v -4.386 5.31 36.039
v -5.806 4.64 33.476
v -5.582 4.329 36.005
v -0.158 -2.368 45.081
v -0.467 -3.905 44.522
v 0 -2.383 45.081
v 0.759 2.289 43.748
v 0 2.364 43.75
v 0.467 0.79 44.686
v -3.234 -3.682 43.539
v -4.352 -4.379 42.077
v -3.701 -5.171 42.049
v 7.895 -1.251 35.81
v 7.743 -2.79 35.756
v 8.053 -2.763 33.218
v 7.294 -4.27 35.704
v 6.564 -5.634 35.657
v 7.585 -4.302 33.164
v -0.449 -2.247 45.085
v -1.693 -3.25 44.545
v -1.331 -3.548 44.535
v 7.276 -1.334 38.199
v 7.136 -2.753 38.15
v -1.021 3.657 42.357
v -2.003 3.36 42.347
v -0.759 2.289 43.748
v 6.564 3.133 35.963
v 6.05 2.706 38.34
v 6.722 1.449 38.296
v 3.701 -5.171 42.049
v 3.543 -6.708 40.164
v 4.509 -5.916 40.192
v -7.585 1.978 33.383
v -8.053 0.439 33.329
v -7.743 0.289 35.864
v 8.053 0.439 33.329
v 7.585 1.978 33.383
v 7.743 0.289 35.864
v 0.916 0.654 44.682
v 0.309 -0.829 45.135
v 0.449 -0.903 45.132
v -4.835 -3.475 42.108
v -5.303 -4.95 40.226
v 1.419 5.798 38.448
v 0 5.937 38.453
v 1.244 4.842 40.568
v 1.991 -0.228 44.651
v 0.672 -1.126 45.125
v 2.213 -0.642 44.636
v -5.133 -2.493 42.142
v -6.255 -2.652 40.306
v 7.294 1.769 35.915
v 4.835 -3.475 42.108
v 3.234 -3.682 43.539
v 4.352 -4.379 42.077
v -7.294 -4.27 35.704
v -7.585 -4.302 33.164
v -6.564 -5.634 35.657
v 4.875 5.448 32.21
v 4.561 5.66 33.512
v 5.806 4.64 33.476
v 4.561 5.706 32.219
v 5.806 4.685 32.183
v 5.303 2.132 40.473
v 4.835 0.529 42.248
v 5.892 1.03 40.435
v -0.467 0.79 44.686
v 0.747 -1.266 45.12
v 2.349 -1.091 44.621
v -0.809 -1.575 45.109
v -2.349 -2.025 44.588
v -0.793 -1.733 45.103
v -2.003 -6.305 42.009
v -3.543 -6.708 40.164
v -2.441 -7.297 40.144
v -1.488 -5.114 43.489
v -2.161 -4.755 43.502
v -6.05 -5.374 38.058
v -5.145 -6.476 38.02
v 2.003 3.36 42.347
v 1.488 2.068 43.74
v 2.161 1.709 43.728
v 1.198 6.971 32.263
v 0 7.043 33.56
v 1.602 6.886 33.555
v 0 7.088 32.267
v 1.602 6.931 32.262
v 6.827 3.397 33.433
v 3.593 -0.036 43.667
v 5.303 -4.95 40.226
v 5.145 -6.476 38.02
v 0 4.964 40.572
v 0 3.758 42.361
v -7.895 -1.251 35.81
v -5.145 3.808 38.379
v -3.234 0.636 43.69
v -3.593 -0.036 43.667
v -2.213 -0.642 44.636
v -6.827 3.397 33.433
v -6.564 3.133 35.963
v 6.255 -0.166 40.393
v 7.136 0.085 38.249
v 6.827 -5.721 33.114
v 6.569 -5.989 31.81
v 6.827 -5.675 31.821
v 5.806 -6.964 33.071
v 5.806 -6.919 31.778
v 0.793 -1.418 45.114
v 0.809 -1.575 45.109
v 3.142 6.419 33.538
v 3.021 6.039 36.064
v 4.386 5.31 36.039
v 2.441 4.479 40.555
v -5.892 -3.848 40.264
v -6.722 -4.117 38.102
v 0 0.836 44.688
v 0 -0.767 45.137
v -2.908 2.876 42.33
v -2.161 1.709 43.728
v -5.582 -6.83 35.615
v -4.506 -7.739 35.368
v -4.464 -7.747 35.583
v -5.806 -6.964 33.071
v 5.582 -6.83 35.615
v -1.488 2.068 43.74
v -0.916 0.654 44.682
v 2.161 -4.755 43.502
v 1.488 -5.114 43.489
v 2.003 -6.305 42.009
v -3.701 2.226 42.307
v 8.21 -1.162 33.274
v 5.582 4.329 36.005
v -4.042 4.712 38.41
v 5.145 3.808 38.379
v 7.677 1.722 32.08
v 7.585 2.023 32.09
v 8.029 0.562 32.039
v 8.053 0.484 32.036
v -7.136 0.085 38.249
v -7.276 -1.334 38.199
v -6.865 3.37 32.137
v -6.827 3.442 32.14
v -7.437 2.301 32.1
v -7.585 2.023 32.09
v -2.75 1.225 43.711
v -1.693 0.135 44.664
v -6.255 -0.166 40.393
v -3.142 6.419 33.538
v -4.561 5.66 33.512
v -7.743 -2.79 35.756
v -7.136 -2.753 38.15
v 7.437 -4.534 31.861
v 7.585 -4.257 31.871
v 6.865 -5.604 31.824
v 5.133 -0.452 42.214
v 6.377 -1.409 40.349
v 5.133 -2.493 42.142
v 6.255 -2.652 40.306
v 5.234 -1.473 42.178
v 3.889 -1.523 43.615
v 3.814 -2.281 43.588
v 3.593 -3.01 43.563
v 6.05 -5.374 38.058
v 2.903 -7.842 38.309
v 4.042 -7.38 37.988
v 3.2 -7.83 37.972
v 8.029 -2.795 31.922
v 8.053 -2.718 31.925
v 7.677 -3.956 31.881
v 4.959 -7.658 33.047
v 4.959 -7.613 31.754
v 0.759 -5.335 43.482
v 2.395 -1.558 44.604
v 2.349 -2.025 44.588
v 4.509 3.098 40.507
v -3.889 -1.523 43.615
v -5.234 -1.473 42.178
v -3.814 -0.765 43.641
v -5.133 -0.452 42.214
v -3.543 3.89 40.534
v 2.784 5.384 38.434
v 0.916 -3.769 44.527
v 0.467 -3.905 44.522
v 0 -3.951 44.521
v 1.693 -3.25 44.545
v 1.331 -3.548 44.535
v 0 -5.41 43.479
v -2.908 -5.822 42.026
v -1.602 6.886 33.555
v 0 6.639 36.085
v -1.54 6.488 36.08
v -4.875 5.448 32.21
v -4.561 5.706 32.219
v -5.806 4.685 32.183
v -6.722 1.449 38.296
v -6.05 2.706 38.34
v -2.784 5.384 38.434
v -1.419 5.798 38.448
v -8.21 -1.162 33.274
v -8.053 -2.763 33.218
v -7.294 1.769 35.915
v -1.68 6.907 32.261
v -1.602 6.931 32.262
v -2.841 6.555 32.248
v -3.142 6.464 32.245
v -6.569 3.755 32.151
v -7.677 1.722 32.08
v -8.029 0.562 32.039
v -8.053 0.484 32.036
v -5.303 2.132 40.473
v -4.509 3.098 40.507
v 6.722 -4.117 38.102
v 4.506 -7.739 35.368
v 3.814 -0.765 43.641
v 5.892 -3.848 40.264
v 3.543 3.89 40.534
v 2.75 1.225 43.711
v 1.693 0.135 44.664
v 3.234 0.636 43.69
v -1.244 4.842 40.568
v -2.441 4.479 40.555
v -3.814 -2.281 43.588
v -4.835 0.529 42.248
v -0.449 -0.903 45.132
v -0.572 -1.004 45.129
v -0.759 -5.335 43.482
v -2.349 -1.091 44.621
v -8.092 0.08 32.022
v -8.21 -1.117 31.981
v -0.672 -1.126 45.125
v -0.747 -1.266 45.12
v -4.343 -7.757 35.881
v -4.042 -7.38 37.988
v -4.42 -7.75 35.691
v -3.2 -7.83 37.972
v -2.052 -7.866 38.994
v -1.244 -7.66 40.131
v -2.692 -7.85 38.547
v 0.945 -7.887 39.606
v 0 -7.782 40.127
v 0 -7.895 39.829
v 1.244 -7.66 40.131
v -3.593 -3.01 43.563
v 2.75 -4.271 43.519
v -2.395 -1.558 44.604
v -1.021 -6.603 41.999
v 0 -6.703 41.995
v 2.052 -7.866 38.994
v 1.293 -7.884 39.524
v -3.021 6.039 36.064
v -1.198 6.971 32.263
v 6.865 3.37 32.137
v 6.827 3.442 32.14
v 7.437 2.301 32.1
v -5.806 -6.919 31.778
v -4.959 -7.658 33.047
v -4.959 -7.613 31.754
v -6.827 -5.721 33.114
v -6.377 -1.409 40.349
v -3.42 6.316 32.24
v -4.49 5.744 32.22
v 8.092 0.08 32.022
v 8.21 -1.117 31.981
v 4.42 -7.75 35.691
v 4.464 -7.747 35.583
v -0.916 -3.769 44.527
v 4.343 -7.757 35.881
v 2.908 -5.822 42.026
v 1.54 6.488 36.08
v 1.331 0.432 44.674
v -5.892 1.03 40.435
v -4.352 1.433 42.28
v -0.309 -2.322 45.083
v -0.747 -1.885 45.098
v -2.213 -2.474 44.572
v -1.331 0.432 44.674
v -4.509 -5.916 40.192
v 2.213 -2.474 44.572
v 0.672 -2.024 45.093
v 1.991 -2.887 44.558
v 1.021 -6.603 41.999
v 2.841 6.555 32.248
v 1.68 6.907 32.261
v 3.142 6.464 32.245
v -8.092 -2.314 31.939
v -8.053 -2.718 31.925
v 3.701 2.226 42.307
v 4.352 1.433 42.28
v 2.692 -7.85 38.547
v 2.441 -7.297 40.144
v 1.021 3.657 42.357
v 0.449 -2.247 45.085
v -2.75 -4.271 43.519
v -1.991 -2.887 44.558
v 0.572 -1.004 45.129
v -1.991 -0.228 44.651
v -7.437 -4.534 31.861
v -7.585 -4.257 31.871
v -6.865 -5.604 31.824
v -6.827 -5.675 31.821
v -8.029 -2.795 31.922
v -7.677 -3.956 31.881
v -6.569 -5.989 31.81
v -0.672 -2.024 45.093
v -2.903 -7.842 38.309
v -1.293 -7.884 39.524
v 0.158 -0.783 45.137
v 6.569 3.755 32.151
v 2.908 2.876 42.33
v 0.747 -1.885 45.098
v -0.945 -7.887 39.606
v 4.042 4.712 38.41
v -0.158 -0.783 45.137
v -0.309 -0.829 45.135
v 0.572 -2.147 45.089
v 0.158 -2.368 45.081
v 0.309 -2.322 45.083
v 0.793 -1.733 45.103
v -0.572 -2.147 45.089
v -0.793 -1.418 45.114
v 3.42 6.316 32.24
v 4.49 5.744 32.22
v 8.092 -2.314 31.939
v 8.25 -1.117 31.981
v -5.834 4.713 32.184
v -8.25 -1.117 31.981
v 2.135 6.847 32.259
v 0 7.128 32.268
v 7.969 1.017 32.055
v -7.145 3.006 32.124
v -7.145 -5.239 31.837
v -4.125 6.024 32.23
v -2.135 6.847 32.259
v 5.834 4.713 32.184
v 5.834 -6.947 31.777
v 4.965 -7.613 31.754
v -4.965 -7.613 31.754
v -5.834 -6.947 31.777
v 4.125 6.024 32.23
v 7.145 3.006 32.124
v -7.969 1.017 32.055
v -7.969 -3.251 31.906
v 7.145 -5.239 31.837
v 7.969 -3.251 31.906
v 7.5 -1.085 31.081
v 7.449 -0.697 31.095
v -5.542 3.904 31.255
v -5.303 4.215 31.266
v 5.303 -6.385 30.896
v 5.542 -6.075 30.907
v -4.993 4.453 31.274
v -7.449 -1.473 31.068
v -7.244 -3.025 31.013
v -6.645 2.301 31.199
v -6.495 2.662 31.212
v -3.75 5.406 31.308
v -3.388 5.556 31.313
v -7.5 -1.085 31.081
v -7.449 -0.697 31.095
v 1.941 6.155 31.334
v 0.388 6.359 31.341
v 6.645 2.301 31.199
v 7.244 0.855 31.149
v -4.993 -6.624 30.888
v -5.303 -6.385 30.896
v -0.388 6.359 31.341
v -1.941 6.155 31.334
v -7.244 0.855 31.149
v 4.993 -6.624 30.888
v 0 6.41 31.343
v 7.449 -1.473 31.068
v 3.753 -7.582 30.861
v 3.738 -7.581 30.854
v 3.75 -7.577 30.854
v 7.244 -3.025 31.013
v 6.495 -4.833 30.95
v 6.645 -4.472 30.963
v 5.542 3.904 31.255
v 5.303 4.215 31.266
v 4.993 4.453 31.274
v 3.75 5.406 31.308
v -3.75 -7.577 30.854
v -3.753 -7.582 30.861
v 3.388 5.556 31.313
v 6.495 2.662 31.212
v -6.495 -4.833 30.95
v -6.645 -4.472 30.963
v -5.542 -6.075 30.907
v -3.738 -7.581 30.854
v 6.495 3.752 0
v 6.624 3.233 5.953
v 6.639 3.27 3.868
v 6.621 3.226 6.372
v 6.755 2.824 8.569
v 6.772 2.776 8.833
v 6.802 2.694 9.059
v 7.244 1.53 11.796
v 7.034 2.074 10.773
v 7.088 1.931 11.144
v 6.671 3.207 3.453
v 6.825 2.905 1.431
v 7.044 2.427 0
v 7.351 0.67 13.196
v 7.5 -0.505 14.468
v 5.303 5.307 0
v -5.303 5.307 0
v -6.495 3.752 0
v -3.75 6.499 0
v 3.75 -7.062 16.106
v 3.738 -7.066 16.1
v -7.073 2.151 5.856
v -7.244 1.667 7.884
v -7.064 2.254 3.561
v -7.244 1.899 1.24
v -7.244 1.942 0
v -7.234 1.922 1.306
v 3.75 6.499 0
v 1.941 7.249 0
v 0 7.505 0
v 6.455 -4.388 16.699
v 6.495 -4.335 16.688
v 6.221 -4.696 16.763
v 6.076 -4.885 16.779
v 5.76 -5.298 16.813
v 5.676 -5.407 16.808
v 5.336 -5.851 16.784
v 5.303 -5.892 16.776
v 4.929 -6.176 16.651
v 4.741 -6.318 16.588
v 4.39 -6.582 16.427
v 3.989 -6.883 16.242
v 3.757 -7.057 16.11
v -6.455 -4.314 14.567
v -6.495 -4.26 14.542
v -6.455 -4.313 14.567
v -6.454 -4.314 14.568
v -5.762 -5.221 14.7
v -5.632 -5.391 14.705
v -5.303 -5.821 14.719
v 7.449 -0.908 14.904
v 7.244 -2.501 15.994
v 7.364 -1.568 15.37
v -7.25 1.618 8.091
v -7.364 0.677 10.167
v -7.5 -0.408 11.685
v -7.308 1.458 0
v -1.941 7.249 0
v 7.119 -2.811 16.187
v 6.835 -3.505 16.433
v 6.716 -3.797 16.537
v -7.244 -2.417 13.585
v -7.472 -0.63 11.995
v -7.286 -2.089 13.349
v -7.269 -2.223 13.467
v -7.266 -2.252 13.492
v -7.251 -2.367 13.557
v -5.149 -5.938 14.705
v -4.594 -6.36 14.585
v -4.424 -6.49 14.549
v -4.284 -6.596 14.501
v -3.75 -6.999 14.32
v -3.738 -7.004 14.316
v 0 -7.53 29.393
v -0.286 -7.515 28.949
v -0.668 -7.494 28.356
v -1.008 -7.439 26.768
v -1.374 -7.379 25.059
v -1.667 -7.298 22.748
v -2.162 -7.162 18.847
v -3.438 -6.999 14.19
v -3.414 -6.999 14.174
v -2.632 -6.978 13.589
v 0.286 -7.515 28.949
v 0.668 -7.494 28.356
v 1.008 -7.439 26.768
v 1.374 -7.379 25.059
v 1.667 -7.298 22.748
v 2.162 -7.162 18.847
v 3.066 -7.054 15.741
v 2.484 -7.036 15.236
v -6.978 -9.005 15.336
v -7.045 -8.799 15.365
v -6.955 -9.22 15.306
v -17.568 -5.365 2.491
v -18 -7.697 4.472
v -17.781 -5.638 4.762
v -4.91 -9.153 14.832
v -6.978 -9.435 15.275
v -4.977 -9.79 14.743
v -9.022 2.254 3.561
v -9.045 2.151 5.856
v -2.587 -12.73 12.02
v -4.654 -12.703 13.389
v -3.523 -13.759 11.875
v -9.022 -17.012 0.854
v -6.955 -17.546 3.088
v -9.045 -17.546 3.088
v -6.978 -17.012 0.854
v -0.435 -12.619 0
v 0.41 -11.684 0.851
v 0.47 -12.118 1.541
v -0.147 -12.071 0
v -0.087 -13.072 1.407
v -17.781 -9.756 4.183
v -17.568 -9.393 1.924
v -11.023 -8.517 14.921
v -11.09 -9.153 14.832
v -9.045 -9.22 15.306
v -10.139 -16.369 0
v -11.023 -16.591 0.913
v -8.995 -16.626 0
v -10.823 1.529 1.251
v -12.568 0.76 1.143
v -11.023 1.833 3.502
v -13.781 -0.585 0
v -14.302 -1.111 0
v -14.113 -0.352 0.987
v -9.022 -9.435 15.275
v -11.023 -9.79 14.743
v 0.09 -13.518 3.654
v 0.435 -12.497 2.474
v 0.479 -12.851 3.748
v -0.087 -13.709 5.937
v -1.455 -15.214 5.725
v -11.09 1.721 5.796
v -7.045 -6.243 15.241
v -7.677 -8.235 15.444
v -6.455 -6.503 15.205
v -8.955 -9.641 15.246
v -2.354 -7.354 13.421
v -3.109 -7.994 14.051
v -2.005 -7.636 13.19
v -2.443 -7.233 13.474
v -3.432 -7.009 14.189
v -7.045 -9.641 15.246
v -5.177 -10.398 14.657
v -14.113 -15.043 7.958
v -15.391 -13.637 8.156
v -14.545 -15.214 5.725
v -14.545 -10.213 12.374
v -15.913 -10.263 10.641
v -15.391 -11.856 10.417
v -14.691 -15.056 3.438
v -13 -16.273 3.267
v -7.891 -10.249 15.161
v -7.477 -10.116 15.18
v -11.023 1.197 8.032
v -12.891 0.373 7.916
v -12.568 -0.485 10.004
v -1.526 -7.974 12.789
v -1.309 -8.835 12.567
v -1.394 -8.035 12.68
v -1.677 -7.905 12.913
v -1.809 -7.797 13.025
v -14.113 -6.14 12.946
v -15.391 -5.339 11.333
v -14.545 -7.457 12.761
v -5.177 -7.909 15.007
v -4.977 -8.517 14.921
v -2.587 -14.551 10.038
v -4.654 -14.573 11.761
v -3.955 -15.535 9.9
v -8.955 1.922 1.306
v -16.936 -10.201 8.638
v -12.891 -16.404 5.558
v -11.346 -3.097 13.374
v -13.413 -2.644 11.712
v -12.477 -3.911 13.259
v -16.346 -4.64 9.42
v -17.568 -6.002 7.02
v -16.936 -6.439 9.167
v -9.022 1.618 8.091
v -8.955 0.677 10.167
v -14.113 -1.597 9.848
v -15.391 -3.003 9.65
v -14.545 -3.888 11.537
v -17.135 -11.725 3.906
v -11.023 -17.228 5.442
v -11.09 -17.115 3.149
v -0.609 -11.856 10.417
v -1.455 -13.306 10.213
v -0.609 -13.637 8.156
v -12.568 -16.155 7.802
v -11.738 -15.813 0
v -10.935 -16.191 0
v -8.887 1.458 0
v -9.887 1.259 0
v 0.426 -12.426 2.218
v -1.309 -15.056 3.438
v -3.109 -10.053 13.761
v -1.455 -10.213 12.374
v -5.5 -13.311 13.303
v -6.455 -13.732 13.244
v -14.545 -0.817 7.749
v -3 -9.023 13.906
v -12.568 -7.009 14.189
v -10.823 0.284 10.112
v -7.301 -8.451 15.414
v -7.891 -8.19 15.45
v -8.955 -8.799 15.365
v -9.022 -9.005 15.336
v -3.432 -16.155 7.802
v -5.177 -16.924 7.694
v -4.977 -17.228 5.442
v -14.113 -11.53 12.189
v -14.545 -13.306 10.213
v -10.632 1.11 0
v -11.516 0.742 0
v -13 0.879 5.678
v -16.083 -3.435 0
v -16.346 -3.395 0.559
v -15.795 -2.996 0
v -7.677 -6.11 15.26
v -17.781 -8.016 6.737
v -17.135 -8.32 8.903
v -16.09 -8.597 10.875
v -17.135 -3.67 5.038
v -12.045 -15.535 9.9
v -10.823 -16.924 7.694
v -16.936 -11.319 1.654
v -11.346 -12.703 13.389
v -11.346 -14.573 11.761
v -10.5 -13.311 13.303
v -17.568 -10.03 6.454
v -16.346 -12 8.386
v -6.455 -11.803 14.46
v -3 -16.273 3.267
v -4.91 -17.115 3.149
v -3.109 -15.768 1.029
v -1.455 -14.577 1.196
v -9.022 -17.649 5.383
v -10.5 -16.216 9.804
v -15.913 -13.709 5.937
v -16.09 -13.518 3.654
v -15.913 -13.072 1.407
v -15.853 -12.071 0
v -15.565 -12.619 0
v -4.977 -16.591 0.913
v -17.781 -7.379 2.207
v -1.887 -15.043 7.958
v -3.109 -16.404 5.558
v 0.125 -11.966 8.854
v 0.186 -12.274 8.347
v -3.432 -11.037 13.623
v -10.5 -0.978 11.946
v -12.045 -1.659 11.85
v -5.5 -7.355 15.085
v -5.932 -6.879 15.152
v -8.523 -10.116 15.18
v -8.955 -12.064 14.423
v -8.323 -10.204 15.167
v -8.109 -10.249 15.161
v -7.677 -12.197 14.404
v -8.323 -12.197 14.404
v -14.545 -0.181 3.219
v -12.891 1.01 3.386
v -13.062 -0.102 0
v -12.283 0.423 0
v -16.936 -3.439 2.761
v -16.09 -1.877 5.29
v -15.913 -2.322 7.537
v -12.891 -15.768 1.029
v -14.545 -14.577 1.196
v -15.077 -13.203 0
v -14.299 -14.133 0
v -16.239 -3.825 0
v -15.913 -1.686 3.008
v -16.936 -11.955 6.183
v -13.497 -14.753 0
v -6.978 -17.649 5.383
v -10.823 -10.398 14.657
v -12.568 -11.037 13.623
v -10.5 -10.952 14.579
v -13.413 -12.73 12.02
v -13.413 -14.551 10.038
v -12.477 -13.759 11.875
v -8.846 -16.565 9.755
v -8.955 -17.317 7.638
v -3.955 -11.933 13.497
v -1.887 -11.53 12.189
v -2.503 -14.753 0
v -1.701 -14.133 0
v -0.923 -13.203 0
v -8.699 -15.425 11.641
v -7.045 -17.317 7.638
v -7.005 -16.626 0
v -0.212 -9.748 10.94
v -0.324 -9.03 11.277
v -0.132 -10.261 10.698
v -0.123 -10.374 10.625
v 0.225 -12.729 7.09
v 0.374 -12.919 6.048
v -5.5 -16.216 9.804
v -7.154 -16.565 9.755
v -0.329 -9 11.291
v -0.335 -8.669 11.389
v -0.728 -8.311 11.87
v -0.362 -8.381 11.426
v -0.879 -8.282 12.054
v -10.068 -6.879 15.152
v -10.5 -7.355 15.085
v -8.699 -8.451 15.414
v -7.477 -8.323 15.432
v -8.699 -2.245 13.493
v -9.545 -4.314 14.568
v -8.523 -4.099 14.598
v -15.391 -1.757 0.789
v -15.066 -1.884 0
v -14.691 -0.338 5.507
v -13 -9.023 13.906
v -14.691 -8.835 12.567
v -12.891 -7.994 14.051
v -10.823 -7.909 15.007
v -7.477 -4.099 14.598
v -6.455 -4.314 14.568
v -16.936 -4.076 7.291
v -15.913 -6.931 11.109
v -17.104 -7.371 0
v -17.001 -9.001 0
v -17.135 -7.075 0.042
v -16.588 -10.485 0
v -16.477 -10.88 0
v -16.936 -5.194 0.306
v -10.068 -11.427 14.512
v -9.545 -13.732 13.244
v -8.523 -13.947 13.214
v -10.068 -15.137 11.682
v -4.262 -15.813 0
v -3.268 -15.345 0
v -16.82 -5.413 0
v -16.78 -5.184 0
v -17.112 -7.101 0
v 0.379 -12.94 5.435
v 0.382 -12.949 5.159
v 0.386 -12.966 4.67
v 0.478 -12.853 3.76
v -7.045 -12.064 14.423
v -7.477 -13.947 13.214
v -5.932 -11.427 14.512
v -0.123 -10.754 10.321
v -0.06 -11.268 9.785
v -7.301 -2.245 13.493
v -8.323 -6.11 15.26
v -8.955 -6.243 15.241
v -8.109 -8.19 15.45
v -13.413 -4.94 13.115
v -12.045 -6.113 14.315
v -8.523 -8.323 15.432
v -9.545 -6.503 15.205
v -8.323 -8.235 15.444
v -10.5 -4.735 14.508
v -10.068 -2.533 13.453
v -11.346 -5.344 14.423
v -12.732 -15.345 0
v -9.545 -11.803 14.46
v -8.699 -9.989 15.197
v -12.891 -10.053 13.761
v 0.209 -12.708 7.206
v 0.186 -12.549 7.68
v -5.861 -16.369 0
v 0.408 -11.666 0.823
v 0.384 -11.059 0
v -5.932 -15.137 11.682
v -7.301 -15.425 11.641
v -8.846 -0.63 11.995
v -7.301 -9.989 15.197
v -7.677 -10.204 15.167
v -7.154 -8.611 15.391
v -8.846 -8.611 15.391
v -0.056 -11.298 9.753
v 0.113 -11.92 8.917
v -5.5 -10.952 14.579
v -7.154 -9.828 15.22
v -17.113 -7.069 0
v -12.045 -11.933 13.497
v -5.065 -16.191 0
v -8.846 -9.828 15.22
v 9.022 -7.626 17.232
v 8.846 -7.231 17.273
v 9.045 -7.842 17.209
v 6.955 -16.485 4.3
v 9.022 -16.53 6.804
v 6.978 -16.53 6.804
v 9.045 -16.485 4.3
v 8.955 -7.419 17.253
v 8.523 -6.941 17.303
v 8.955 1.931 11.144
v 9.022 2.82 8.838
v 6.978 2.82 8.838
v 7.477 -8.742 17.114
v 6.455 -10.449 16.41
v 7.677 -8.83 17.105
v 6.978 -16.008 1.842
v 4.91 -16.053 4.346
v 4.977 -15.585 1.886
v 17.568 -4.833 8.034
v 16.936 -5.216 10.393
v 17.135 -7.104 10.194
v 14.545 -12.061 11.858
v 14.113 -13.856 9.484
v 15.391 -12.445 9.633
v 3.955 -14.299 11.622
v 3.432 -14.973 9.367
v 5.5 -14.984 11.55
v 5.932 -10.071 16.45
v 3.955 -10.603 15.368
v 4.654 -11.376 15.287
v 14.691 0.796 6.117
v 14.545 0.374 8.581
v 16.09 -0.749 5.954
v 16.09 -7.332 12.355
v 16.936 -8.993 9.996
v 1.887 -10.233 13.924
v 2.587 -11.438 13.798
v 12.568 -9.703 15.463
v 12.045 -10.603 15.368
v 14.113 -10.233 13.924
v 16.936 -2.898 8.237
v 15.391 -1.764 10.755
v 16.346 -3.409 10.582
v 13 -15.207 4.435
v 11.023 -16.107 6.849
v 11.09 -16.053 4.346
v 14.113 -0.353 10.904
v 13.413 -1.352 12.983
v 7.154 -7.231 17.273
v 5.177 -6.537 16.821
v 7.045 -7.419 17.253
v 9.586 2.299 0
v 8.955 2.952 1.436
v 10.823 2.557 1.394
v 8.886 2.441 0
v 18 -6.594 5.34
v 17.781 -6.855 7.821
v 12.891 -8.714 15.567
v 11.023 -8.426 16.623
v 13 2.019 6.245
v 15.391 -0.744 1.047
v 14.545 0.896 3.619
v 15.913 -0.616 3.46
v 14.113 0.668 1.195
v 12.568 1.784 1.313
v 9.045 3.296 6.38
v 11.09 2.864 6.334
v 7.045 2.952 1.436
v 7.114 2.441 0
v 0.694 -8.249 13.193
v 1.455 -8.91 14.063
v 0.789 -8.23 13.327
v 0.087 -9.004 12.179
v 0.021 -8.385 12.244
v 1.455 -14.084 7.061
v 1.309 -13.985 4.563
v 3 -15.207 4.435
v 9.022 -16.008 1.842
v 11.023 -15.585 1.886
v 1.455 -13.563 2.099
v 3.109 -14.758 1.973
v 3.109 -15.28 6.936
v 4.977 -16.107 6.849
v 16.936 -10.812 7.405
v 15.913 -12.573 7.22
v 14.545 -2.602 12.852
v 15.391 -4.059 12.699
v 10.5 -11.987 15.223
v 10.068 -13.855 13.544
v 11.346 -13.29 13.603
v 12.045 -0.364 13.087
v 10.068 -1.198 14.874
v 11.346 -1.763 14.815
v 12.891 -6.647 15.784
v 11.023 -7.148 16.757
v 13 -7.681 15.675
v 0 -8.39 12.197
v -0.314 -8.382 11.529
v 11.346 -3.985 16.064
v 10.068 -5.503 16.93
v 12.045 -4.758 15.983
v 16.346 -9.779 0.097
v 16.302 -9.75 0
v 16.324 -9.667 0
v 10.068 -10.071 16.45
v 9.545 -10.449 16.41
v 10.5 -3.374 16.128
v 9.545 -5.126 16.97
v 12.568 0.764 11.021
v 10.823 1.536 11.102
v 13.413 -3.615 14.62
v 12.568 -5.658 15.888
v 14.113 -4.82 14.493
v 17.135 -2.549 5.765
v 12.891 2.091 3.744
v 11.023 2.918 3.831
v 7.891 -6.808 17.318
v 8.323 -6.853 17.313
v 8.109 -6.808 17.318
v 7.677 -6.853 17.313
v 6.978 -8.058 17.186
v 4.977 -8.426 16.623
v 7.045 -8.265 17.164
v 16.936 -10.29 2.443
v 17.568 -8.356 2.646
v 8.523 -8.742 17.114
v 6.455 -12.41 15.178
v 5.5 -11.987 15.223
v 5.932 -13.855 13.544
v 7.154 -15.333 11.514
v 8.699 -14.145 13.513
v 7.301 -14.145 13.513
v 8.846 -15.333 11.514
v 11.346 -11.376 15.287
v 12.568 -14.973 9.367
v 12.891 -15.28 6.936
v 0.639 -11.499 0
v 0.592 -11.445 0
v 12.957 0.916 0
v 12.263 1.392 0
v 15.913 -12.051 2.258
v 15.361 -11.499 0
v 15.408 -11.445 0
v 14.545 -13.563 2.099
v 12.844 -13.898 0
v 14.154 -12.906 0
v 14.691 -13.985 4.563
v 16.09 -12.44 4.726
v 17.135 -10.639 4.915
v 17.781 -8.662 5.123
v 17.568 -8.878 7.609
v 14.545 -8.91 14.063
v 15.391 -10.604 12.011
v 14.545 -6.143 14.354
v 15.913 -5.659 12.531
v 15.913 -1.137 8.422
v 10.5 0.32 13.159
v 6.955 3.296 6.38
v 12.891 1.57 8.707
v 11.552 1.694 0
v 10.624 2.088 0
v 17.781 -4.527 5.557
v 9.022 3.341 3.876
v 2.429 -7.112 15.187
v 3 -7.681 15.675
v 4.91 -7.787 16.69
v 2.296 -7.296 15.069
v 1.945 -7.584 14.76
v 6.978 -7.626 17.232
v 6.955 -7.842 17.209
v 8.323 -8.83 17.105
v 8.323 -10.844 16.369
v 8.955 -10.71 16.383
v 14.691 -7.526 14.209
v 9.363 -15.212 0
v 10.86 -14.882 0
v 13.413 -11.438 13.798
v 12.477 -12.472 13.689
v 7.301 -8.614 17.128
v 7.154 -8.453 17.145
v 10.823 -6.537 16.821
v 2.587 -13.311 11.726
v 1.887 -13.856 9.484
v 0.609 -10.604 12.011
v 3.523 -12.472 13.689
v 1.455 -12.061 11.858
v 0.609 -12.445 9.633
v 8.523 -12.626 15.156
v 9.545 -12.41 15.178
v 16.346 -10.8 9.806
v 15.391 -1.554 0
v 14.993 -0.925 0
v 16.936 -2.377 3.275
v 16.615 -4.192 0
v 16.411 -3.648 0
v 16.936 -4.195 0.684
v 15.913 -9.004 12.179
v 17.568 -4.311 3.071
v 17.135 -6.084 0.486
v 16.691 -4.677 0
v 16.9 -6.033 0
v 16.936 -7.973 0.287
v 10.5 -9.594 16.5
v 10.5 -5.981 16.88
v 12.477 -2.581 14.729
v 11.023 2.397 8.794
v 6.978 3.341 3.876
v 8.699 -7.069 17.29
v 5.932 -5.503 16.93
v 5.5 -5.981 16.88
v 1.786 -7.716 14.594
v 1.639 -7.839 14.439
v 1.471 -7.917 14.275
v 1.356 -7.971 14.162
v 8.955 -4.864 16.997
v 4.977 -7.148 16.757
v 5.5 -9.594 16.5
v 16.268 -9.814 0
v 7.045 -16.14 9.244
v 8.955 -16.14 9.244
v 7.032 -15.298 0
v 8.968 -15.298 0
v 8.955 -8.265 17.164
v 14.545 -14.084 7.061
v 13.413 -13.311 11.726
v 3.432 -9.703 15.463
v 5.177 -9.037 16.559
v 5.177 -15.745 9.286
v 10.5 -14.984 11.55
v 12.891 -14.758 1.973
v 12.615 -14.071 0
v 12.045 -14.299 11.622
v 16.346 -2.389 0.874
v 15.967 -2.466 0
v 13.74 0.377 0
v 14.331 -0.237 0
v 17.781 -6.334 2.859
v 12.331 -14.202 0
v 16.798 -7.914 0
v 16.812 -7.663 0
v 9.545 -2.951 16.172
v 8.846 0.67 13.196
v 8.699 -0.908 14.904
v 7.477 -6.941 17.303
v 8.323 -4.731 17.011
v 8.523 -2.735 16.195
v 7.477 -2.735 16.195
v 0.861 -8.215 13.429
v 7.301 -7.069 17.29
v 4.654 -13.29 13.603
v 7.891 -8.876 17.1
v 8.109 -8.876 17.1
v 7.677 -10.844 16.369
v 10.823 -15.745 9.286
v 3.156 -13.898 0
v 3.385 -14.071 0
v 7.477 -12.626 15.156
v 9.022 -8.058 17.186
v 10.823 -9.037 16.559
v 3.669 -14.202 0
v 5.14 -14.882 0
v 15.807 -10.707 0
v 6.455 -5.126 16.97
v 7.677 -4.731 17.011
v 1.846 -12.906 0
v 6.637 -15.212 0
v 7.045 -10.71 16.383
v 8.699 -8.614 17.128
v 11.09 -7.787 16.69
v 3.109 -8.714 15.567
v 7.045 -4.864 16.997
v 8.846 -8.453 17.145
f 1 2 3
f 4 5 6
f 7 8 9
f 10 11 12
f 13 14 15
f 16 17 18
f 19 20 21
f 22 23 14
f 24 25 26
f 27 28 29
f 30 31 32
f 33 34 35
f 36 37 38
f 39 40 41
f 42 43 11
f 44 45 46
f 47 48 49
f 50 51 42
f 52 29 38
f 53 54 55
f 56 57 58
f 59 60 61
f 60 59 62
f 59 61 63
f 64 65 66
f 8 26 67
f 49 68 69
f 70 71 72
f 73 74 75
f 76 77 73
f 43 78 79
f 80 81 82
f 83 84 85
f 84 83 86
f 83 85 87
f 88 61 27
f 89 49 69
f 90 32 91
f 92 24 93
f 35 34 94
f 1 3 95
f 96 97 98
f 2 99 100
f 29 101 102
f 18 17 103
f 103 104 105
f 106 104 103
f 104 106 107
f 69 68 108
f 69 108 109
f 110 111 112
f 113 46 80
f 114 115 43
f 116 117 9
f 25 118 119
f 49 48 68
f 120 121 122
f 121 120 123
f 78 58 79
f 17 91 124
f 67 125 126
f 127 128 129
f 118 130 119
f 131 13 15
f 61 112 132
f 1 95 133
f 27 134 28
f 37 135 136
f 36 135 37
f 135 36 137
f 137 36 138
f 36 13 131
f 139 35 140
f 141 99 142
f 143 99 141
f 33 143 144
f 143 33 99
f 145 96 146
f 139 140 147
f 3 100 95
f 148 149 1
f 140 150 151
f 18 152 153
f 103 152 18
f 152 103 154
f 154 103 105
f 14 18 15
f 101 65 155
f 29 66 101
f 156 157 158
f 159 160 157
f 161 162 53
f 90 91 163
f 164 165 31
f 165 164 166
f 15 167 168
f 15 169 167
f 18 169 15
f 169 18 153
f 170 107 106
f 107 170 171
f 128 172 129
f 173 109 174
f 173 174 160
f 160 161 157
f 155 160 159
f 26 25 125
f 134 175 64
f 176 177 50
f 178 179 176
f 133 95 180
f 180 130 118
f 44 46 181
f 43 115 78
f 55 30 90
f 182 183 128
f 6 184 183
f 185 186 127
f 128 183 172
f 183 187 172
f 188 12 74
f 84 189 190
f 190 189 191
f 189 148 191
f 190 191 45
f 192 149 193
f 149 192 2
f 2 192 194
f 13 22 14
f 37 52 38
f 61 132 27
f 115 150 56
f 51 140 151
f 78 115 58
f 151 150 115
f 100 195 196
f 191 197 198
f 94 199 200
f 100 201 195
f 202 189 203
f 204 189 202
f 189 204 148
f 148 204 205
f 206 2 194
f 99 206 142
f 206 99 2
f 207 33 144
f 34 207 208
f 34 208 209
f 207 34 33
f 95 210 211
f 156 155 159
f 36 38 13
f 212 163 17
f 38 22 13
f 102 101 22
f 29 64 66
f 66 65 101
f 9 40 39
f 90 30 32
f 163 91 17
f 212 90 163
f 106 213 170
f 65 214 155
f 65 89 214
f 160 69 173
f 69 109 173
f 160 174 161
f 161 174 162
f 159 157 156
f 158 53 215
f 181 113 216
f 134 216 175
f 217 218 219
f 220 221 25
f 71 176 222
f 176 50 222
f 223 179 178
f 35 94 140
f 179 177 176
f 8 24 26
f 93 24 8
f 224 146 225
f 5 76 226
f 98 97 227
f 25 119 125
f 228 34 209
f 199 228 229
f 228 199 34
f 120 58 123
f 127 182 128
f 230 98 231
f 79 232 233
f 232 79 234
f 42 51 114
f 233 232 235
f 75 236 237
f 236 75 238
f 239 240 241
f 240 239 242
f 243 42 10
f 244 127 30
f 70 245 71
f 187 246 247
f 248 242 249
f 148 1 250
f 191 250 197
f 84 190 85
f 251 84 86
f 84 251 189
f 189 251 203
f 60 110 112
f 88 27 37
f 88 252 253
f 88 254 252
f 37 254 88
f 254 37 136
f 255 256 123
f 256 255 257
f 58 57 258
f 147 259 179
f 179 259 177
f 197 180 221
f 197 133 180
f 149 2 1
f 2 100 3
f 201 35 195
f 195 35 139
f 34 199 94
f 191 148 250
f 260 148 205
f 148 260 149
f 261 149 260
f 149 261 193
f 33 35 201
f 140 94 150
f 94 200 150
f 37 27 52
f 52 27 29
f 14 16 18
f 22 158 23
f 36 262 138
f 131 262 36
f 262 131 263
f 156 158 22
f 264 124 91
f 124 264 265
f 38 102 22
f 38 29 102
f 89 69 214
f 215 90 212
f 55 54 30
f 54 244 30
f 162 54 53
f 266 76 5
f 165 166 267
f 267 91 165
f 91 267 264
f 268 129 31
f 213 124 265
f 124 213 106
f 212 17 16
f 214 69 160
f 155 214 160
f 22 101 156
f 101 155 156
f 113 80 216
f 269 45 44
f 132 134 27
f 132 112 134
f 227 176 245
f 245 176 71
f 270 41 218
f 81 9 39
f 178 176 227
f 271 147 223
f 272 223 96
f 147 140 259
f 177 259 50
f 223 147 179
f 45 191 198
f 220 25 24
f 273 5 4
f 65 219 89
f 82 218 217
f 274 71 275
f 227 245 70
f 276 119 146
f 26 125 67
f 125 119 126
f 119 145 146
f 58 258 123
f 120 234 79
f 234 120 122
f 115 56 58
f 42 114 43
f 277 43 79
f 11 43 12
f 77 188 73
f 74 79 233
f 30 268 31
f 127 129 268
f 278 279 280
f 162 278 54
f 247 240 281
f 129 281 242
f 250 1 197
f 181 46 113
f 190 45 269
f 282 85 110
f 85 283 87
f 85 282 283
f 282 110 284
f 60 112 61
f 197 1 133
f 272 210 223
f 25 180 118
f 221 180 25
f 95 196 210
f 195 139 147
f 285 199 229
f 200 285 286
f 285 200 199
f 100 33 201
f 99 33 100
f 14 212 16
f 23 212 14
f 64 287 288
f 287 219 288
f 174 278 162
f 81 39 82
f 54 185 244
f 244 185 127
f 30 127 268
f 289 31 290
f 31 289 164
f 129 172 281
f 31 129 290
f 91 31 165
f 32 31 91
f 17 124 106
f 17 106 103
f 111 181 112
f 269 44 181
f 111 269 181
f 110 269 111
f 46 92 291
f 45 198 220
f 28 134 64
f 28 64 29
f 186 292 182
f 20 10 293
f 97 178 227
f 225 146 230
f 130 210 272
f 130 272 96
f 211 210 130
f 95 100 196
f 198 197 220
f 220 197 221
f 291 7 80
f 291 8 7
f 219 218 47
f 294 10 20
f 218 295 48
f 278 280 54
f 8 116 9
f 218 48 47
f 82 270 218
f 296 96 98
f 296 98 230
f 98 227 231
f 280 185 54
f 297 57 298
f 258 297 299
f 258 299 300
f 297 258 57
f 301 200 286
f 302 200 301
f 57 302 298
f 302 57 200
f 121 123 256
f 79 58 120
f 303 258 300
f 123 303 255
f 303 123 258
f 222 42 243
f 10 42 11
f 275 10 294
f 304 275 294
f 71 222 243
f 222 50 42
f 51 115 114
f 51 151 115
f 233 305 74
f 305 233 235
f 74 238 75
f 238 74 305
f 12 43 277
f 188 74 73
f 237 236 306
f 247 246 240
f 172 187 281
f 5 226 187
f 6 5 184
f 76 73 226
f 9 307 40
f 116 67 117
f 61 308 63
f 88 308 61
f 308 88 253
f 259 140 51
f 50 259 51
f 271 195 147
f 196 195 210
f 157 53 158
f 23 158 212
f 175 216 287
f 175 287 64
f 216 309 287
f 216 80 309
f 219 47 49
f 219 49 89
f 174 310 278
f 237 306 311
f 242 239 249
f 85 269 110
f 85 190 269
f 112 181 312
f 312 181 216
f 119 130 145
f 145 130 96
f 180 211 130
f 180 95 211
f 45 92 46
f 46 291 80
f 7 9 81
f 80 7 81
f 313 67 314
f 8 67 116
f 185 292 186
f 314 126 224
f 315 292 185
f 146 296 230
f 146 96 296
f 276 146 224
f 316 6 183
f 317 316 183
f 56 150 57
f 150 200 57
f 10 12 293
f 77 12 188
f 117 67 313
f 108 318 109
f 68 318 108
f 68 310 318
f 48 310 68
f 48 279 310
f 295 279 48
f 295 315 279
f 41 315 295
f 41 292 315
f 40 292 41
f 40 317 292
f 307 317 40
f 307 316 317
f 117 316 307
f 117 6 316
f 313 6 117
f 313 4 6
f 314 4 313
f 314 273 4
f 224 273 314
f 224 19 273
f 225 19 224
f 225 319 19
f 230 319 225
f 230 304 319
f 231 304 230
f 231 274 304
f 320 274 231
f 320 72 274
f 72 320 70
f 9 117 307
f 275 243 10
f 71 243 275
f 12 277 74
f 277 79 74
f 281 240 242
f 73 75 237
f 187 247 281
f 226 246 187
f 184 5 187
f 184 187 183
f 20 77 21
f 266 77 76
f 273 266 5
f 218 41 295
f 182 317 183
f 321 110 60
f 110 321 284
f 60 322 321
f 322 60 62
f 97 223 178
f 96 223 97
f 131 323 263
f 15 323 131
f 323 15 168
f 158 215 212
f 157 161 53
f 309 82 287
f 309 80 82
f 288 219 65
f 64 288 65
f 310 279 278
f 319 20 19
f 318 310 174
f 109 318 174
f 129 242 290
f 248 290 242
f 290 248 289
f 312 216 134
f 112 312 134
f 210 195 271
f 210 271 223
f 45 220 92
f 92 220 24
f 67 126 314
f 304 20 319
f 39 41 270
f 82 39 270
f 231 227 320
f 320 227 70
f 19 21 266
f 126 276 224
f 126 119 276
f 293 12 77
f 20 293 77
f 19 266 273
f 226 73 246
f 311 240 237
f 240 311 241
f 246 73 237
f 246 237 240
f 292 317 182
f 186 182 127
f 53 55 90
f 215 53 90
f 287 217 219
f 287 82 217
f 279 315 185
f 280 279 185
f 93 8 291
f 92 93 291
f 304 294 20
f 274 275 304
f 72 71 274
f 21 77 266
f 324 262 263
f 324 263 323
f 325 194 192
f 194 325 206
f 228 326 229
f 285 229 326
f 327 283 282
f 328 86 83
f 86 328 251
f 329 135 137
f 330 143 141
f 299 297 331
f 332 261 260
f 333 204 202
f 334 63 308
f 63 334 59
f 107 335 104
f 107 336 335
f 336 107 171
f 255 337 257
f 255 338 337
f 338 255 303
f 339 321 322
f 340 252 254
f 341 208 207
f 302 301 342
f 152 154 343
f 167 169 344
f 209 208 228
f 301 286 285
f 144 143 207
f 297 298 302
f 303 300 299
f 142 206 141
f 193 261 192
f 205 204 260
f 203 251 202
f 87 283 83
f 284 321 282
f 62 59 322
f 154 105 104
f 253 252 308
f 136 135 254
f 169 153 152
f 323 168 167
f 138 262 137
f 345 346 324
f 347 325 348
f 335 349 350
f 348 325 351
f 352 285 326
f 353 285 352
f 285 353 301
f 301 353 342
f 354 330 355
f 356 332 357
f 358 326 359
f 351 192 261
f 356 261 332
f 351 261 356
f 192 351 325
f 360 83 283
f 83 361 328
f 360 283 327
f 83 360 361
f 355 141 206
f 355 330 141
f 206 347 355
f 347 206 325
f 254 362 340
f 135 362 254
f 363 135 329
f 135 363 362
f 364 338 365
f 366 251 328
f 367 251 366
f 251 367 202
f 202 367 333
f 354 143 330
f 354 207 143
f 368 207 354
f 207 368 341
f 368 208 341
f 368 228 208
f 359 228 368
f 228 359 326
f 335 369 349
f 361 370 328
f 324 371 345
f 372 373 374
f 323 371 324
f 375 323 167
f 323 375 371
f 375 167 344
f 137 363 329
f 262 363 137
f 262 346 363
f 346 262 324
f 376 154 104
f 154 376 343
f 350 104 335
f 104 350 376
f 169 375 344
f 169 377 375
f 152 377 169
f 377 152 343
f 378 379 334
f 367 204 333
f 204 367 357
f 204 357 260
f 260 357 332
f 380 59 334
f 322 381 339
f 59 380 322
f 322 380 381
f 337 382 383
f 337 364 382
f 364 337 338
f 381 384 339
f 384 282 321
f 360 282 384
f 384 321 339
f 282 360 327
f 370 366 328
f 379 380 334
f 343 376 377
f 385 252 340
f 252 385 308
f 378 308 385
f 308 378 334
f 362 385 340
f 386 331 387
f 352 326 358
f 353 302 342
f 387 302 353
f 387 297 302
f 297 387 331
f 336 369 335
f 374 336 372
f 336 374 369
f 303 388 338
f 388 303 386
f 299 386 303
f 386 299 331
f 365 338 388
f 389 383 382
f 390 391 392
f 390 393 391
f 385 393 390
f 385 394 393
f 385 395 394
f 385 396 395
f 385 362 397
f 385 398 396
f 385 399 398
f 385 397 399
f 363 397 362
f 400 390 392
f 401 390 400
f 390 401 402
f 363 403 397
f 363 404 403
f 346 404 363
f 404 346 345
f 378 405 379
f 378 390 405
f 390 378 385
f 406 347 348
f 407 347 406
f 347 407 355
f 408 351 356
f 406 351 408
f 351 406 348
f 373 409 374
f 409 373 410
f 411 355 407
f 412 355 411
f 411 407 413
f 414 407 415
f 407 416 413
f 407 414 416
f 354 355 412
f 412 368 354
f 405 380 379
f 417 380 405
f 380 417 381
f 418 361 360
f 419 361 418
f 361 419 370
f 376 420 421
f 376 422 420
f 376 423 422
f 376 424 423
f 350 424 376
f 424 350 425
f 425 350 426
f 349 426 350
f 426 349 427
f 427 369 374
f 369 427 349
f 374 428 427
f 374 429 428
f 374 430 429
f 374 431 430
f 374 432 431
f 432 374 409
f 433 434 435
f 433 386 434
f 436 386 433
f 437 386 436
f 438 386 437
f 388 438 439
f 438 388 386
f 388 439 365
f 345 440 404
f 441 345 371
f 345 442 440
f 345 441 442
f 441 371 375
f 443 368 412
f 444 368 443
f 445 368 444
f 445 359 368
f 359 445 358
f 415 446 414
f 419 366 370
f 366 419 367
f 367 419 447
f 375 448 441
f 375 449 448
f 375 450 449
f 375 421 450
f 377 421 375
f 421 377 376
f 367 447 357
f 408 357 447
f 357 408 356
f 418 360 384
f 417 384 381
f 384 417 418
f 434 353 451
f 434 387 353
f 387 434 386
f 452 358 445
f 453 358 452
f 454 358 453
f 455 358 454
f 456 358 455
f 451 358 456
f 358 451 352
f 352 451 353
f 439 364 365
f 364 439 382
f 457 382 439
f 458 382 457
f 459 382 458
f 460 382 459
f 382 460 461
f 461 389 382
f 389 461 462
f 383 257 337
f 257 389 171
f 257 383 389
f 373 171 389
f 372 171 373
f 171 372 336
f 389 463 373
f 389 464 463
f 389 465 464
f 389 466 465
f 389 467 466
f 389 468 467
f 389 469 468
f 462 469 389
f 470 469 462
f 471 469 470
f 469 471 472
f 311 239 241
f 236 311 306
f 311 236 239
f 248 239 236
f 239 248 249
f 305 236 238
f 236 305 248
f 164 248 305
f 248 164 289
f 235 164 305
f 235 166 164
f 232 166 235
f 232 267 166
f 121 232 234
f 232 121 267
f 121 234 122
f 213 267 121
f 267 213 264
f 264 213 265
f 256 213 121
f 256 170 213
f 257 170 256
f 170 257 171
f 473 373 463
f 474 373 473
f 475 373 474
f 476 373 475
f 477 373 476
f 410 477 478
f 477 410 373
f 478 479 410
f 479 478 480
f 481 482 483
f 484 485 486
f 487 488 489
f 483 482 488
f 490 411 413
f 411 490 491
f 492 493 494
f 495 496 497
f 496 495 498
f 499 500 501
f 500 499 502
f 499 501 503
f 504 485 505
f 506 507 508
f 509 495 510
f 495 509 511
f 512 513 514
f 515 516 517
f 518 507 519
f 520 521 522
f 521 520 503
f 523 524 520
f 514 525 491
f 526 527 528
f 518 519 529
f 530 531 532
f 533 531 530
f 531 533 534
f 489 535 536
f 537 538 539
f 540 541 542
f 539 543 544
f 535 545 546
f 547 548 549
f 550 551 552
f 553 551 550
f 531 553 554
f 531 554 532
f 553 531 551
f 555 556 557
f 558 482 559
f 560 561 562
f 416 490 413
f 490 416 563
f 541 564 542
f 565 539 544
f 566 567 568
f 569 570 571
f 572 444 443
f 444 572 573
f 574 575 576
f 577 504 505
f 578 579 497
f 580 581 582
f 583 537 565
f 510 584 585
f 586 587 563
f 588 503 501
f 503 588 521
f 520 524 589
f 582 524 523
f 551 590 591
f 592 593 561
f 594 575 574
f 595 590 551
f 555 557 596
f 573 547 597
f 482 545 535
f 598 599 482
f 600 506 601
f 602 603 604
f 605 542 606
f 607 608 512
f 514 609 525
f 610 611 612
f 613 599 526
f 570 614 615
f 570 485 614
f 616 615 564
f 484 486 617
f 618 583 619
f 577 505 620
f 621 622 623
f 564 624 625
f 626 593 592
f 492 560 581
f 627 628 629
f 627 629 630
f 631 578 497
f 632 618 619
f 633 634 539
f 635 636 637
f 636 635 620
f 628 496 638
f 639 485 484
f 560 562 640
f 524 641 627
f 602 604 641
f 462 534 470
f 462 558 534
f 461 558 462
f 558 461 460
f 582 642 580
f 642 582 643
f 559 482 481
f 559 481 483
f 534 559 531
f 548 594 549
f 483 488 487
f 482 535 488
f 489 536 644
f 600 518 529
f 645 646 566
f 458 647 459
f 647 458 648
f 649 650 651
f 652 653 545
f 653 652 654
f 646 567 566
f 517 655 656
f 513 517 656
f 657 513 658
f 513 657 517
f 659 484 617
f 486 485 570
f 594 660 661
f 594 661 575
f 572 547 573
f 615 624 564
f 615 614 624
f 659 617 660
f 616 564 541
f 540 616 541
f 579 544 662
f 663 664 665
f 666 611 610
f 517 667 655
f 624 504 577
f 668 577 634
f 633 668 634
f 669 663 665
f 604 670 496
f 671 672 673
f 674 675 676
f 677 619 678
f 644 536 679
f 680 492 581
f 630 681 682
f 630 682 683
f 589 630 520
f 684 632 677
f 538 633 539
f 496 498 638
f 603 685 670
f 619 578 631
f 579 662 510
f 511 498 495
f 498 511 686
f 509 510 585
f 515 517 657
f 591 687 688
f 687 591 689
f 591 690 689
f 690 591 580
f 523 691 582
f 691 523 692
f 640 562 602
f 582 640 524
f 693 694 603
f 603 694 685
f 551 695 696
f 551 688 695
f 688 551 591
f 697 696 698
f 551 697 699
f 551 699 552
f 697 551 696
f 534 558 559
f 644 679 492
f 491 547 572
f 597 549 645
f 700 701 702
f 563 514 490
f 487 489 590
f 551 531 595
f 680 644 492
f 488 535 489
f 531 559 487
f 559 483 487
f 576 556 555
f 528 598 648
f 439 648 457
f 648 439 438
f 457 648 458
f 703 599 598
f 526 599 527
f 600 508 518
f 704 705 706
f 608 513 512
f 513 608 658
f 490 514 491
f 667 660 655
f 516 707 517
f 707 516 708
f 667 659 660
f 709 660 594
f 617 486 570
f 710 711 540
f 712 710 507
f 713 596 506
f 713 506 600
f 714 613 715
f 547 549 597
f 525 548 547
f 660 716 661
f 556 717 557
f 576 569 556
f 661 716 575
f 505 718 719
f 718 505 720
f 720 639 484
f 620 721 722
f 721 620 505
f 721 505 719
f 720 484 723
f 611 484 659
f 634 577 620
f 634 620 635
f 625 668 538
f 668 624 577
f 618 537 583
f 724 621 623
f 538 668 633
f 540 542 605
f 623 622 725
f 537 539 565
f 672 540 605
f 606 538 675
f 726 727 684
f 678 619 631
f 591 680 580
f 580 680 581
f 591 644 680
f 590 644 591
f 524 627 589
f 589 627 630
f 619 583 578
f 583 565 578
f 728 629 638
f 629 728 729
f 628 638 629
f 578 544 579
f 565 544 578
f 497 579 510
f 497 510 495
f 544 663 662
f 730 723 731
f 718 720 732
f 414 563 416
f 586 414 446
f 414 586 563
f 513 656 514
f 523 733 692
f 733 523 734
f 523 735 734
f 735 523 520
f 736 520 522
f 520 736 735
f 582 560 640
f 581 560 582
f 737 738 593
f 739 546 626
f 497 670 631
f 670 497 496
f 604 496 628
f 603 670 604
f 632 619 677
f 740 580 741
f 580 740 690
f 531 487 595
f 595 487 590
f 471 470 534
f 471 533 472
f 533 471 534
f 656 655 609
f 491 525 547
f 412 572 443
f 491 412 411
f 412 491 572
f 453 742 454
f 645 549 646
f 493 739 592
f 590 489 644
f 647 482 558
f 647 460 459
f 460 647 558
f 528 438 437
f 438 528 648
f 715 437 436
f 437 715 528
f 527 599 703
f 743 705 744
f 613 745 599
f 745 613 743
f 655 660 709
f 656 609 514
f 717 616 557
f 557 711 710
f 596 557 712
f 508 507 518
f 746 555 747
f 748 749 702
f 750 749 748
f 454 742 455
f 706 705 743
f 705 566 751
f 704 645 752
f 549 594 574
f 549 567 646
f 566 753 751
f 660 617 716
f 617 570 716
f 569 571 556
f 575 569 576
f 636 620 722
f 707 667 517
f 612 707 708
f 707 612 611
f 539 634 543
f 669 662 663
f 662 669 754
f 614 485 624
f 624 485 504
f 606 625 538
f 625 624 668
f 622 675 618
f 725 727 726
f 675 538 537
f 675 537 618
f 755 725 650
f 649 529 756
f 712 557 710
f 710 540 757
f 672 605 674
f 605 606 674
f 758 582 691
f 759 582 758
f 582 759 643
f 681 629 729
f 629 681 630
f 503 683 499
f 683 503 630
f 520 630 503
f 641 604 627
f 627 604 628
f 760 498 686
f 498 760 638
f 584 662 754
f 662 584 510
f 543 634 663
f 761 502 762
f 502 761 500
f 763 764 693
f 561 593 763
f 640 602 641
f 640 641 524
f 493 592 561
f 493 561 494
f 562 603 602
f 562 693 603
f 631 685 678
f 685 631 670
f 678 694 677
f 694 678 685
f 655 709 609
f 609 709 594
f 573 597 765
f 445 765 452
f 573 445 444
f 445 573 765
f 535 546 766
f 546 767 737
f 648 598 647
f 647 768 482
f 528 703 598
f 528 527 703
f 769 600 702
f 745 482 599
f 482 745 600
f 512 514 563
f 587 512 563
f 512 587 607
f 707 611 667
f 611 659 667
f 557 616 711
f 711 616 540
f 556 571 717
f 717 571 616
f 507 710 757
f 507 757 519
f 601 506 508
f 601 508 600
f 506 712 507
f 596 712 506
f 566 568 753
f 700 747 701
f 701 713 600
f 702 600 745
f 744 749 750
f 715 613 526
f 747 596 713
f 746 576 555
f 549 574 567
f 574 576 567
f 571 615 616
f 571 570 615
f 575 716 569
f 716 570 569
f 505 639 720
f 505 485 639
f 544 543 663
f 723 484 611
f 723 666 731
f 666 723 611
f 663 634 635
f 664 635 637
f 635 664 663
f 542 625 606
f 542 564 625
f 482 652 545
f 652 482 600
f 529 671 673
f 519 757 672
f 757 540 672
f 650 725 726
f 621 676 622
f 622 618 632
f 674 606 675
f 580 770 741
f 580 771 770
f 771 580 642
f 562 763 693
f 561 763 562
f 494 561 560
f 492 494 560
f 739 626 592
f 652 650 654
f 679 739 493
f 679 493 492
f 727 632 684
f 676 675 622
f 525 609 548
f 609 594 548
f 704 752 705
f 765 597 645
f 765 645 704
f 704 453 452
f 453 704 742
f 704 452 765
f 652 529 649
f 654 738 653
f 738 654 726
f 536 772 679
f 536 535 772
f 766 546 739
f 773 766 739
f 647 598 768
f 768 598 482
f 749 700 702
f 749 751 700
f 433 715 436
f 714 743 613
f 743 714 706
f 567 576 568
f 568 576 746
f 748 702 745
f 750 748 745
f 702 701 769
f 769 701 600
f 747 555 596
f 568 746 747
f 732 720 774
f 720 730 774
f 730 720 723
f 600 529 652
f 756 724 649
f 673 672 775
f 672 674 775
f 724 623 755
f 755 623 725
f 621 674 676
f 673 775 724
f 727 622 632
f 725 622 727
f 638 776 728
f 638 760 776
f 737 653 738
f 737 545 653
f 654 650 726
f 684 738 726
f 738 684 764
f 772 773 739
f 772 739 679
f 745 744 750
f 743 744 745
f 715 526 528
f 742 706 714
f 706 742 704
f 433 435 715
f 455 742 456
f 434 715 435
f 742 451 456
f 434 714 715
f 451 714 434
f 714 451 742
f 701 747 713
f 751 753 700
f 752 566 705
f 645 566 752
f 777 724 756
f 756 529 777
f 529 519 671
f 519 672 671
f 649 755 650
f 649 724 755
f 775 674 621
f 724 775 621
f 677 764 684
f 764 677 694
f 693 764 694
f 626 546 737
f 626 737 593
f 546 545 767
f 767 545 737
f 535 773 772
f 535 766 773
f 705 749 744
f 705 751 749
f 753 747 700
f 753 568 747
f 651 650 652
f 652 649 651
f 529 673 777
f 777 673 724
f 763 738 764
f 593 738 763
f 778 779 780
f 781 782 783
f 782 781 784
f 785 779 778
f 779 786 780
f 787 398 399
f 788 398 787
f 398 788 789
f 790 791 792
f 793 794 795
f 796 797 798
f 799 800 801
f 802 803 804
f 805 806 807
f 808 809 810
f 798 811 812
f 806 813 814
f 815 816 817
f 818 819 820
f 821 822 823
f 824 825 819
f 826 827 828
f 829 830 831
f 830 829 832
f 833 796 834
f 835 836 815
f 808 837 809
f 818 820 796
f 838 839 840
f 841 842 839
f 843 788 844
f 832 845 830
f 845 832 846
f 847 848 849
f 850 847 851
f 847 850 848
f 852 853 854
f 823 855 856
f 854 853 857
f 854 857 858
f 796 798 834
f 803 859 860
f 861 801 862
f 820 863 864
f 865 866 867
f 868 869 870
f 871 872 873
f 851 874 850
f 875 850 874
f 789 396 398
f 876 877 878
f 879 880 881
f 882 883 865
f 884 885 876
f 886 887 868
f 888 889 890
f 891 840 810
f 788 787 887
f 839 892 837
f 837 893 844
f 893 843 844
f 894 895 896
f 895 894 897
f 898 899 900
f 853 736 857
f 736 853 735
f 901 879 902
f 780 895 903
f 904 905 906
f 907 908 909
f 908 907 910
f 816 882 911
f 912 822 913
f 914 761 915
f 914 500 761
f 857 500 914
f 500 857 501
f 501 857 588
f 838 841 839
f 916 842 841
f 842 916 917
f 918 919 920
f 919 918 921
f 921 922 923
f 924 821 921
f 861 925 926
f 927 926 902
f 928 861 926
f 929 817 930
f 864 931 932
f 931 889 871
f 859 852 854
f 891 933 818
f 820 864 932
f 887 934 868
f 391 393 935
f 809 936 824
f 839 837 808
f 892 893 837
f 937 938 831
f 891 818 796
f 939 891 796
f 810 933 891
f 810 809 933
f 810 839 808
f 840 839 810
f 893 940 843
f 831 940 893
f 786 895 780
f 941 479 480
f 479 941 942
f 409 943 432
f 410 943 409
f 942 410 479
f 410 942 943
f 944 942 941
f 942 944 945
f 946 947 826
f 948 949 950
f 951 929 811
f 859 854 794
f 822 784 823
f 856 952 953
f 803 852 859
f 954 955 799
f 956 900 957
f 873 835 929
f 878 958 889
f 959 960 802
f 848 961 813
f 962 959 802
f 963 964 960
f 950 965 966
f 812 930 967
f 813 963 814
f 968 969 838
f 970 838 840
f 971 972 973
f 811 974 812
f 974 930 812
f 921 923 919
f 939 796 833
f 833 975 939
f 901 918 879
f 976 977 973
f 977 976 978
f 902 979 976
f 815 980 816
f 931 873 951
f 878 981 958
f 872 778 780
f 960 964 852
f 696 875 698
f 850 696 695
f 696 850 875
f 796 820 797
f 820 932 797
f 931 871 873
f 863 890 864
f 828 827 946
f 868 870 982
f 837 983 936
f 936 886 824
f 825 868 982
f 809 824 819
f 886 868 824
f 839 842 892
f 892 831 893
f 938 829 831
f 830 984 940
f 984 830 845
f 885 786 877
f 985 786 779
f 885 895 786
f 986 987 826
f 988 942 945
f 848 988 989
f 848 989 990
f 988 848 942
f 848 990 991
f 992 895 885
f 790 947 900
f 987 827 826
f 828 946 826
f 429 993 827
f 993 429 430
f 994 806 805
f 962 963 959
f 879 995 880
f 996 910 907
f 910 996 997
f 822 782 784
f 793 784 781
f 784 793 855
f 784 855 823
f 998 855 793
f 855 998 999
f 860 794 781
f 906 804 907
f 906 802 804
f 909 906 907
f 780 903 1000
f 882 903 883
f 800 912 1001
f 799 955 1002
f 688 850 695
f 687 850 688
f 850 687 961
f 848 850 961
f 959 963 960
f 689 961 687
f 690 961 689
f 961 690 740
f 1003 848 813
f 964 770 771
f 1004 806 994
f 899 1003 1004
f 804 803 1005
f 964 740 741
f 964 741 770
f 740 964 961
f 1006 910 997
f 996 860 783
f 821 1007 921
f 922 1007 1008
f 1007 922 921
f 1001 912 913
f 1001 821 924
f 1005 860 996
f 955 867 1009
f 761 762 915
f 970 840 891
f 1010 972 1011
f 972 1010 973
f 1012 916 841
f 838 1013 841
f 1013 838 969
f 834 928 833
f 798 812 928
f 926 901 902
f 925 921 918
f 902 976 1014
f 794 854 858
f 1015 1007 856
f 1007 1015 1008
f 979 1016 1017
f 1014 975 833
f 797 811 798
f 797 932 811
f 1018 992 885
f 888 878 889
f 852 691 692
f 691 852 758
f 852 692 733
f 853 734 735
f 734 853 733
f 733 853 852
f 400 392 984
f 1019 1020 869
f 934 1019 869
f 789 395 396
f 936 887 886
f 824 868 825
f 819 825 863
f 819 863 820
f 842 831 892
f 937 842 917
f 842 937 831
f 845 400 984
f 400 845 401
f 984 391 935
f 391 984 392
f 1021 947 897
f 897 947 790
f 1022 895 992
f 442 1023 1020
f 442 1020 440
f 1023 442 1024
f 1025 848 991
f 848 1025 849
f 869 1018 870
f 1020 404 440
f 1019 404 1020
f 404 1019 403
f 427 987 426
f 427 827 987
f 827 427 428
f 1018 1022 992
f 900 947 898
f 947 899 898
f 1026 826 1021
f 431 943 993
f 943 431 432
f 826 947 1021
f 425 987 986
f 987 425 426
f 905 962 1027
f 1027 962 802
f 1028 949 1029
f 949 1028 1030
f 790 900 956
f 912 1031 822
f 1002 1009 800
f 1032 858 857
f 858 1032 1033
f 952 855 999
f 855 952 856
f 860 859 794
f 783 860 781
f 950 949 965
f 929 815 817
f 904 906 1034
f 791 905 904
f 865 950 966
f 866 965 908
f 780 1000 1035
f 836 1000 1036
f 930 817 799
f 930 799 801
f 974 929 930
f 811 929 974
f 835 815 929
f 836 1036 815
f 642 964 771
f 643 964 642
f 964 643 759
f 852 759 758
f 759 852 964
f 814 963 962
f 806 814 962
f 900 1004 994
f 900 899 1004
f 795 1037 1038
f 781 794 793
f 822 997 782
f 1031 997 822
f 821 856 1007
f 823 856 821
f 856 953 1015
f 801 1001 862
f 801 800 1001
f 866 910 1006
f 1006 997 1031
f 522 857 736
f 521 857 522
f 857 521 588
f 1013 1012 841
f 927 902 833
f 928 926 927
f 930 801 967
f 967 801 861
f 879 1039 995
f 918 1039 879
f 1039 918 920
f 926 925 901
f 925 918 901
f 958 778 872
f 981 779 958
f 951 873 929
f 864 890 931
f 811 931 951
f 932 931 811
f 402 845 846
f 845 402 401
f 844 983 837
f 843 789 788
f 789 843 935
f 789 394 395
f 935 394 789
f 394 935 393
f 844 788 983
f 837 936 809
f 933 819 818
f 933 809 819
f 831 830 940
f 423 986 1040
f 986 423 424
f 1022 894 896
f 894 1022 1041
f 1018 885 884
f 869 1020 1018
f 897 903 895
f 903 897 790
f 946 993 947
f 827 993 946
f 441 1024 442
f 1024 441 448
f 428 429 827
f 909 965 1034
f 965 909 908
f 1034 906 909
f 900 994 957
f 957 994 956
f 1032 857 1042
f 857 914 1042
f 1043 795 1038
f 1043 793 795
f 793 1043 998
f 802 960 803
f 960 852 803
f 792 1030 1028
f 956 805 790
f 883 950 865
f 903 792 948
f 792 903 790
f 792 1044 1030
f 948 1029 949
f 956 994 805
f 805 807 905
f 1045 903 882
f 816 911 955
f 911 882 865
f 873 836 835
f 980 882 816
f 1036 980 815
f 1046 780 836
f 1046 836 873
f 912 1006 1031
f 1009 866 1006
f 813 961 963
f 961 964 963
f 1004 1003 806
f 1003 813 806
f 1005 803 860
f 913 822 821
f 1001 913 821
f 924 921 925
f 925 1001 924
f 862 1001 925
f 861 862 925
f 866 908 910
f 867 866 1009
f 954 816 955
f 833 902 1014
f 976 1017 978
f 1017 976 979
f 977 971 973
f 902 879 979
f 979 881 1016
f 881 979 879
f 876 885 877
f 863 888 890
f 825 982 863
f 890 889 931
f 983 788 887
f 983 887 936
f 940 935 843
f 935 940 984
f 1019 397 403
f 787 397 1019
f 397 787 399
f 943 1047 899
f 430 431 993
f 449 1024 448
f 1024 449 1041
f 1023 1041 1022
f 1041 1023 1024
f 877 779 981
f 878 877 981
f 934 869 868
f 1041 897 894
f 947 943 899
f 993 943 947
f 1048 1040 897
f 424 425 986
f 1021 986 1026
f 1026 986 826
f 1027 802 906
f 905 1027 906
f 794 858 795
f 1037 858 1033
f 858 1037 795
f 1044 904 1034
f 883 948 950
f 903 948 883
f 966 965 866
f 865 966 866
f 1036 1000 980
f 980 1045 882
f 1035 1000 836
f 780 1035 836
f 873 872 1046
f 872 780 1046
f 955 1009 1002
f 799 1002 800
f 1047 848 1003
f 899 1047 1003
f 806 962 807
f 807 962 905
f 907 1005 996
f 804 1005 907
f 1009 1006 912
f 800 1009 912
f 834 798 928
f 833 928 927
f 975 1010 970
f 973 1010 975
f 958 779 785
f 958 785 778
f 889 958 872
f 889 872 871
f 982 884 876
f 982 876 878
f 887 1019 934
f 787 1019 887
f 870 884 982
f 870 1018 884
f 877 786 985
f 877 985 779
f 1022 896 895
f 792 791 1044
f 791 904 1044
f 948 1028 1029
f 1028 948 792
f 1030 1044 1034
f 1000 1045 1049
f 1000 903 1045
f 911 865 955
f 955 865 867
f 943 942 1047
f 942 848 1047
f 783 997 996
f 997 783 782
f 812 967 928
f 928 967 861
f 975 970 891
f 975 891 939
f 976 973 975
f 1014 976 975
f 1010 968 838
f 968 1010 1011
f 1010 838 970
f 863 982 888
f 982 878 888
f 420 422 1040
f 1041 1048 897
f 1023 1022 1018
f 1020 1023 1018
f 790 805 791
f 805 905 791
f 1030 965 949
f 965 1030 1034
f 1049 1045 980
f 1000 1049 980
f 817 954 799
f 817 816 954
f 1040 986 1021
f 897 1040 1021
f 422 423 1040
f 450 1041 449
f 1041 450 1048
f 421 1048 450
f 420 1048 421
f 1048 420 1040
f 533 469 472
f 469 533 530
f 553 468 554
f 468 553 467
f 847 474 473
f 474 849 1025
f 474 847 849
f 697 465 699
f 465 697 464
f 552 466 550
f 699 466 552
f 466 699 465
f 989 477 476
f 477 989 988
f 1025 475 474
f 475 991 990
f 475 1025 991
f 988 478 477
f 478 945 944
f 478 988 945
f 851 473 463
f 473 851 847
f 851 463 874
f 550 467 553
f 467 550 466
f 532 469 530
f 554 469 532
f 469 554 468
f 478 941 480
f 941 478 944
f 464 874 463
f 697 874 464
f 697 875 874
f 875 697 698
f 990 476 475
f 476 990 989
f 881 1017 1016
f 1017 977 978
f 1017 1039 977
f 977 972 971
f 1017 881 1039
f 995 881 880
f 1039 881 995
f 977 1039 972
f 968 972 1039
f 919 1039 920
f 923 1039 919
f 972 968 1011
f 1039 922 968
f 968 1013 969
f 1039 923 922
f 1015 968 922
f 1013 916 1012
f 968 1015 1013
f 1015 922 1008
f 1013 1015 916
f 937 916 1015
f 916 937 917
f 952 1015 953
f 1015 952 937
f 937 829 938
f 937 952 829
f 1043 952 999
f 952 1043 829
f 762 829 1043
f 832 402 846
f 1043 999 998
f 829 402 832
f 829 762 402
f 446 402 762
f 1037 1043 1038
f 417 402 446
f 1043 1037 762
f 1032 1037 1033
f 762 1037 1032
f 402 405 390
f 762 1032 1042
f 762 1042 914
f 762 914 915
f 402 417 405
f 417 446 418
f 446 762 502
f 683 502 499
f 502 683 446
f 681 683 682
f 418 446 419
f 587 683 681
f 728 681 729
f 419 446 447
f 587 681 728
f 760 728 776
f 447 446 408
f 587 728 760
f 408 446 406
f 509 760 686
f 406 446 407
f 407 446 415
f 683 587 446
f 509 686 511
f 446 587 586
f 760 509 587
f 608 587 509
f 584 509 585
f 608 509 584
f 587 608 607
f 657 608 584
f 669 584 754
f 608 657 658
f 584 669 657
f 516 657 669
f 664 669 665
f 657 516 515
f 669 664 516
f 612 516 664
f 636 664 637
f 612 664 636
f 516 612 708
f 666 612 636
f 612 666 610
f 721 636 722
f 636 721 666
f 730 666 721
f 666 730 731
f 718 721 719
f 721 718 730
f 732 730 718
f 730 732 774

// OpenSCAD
difference()
{
    union()
    {
        rotate(a=2, v=[1,0,0])
        difference()
        {
            translate([0,0,-3]) union()
            {
                cylinder(h=35,d=15,$fn=24);
                translate([0,0,35])

                
                scale(1.1,1.1,1)
                union()
                {
                    scale([1,1,1.6])difference()
                    {
                        sphere(d=15, $fn=32, center=true);
                        translate([0,0,-15]) cube(size=[15,15,30], center=true);
                    }
                    translate([0,0,-3]) cylinder(h=3, d1=10, d2=15, $fn=24);
                }
            }
            translate([0,-14,0]) cube(size=[15,15,120],center=true);
        }
        

        rotate(a=8, v=[1,0,0])scale([1,1,1.1]) translate([-8,-7,5]) sphere(d=20);
        rotate(a=6, v=[1,0,0])scale([1,1,1.2]) translate([+8,-6,5]) sphere(d=20);

        
        translate([0,-5,0]) cylinder(d1=8, d2=4, h=40, $fn=24);
    }
    translate([0,0,-20]) cube(size=[40,40,40], center=true);
}
